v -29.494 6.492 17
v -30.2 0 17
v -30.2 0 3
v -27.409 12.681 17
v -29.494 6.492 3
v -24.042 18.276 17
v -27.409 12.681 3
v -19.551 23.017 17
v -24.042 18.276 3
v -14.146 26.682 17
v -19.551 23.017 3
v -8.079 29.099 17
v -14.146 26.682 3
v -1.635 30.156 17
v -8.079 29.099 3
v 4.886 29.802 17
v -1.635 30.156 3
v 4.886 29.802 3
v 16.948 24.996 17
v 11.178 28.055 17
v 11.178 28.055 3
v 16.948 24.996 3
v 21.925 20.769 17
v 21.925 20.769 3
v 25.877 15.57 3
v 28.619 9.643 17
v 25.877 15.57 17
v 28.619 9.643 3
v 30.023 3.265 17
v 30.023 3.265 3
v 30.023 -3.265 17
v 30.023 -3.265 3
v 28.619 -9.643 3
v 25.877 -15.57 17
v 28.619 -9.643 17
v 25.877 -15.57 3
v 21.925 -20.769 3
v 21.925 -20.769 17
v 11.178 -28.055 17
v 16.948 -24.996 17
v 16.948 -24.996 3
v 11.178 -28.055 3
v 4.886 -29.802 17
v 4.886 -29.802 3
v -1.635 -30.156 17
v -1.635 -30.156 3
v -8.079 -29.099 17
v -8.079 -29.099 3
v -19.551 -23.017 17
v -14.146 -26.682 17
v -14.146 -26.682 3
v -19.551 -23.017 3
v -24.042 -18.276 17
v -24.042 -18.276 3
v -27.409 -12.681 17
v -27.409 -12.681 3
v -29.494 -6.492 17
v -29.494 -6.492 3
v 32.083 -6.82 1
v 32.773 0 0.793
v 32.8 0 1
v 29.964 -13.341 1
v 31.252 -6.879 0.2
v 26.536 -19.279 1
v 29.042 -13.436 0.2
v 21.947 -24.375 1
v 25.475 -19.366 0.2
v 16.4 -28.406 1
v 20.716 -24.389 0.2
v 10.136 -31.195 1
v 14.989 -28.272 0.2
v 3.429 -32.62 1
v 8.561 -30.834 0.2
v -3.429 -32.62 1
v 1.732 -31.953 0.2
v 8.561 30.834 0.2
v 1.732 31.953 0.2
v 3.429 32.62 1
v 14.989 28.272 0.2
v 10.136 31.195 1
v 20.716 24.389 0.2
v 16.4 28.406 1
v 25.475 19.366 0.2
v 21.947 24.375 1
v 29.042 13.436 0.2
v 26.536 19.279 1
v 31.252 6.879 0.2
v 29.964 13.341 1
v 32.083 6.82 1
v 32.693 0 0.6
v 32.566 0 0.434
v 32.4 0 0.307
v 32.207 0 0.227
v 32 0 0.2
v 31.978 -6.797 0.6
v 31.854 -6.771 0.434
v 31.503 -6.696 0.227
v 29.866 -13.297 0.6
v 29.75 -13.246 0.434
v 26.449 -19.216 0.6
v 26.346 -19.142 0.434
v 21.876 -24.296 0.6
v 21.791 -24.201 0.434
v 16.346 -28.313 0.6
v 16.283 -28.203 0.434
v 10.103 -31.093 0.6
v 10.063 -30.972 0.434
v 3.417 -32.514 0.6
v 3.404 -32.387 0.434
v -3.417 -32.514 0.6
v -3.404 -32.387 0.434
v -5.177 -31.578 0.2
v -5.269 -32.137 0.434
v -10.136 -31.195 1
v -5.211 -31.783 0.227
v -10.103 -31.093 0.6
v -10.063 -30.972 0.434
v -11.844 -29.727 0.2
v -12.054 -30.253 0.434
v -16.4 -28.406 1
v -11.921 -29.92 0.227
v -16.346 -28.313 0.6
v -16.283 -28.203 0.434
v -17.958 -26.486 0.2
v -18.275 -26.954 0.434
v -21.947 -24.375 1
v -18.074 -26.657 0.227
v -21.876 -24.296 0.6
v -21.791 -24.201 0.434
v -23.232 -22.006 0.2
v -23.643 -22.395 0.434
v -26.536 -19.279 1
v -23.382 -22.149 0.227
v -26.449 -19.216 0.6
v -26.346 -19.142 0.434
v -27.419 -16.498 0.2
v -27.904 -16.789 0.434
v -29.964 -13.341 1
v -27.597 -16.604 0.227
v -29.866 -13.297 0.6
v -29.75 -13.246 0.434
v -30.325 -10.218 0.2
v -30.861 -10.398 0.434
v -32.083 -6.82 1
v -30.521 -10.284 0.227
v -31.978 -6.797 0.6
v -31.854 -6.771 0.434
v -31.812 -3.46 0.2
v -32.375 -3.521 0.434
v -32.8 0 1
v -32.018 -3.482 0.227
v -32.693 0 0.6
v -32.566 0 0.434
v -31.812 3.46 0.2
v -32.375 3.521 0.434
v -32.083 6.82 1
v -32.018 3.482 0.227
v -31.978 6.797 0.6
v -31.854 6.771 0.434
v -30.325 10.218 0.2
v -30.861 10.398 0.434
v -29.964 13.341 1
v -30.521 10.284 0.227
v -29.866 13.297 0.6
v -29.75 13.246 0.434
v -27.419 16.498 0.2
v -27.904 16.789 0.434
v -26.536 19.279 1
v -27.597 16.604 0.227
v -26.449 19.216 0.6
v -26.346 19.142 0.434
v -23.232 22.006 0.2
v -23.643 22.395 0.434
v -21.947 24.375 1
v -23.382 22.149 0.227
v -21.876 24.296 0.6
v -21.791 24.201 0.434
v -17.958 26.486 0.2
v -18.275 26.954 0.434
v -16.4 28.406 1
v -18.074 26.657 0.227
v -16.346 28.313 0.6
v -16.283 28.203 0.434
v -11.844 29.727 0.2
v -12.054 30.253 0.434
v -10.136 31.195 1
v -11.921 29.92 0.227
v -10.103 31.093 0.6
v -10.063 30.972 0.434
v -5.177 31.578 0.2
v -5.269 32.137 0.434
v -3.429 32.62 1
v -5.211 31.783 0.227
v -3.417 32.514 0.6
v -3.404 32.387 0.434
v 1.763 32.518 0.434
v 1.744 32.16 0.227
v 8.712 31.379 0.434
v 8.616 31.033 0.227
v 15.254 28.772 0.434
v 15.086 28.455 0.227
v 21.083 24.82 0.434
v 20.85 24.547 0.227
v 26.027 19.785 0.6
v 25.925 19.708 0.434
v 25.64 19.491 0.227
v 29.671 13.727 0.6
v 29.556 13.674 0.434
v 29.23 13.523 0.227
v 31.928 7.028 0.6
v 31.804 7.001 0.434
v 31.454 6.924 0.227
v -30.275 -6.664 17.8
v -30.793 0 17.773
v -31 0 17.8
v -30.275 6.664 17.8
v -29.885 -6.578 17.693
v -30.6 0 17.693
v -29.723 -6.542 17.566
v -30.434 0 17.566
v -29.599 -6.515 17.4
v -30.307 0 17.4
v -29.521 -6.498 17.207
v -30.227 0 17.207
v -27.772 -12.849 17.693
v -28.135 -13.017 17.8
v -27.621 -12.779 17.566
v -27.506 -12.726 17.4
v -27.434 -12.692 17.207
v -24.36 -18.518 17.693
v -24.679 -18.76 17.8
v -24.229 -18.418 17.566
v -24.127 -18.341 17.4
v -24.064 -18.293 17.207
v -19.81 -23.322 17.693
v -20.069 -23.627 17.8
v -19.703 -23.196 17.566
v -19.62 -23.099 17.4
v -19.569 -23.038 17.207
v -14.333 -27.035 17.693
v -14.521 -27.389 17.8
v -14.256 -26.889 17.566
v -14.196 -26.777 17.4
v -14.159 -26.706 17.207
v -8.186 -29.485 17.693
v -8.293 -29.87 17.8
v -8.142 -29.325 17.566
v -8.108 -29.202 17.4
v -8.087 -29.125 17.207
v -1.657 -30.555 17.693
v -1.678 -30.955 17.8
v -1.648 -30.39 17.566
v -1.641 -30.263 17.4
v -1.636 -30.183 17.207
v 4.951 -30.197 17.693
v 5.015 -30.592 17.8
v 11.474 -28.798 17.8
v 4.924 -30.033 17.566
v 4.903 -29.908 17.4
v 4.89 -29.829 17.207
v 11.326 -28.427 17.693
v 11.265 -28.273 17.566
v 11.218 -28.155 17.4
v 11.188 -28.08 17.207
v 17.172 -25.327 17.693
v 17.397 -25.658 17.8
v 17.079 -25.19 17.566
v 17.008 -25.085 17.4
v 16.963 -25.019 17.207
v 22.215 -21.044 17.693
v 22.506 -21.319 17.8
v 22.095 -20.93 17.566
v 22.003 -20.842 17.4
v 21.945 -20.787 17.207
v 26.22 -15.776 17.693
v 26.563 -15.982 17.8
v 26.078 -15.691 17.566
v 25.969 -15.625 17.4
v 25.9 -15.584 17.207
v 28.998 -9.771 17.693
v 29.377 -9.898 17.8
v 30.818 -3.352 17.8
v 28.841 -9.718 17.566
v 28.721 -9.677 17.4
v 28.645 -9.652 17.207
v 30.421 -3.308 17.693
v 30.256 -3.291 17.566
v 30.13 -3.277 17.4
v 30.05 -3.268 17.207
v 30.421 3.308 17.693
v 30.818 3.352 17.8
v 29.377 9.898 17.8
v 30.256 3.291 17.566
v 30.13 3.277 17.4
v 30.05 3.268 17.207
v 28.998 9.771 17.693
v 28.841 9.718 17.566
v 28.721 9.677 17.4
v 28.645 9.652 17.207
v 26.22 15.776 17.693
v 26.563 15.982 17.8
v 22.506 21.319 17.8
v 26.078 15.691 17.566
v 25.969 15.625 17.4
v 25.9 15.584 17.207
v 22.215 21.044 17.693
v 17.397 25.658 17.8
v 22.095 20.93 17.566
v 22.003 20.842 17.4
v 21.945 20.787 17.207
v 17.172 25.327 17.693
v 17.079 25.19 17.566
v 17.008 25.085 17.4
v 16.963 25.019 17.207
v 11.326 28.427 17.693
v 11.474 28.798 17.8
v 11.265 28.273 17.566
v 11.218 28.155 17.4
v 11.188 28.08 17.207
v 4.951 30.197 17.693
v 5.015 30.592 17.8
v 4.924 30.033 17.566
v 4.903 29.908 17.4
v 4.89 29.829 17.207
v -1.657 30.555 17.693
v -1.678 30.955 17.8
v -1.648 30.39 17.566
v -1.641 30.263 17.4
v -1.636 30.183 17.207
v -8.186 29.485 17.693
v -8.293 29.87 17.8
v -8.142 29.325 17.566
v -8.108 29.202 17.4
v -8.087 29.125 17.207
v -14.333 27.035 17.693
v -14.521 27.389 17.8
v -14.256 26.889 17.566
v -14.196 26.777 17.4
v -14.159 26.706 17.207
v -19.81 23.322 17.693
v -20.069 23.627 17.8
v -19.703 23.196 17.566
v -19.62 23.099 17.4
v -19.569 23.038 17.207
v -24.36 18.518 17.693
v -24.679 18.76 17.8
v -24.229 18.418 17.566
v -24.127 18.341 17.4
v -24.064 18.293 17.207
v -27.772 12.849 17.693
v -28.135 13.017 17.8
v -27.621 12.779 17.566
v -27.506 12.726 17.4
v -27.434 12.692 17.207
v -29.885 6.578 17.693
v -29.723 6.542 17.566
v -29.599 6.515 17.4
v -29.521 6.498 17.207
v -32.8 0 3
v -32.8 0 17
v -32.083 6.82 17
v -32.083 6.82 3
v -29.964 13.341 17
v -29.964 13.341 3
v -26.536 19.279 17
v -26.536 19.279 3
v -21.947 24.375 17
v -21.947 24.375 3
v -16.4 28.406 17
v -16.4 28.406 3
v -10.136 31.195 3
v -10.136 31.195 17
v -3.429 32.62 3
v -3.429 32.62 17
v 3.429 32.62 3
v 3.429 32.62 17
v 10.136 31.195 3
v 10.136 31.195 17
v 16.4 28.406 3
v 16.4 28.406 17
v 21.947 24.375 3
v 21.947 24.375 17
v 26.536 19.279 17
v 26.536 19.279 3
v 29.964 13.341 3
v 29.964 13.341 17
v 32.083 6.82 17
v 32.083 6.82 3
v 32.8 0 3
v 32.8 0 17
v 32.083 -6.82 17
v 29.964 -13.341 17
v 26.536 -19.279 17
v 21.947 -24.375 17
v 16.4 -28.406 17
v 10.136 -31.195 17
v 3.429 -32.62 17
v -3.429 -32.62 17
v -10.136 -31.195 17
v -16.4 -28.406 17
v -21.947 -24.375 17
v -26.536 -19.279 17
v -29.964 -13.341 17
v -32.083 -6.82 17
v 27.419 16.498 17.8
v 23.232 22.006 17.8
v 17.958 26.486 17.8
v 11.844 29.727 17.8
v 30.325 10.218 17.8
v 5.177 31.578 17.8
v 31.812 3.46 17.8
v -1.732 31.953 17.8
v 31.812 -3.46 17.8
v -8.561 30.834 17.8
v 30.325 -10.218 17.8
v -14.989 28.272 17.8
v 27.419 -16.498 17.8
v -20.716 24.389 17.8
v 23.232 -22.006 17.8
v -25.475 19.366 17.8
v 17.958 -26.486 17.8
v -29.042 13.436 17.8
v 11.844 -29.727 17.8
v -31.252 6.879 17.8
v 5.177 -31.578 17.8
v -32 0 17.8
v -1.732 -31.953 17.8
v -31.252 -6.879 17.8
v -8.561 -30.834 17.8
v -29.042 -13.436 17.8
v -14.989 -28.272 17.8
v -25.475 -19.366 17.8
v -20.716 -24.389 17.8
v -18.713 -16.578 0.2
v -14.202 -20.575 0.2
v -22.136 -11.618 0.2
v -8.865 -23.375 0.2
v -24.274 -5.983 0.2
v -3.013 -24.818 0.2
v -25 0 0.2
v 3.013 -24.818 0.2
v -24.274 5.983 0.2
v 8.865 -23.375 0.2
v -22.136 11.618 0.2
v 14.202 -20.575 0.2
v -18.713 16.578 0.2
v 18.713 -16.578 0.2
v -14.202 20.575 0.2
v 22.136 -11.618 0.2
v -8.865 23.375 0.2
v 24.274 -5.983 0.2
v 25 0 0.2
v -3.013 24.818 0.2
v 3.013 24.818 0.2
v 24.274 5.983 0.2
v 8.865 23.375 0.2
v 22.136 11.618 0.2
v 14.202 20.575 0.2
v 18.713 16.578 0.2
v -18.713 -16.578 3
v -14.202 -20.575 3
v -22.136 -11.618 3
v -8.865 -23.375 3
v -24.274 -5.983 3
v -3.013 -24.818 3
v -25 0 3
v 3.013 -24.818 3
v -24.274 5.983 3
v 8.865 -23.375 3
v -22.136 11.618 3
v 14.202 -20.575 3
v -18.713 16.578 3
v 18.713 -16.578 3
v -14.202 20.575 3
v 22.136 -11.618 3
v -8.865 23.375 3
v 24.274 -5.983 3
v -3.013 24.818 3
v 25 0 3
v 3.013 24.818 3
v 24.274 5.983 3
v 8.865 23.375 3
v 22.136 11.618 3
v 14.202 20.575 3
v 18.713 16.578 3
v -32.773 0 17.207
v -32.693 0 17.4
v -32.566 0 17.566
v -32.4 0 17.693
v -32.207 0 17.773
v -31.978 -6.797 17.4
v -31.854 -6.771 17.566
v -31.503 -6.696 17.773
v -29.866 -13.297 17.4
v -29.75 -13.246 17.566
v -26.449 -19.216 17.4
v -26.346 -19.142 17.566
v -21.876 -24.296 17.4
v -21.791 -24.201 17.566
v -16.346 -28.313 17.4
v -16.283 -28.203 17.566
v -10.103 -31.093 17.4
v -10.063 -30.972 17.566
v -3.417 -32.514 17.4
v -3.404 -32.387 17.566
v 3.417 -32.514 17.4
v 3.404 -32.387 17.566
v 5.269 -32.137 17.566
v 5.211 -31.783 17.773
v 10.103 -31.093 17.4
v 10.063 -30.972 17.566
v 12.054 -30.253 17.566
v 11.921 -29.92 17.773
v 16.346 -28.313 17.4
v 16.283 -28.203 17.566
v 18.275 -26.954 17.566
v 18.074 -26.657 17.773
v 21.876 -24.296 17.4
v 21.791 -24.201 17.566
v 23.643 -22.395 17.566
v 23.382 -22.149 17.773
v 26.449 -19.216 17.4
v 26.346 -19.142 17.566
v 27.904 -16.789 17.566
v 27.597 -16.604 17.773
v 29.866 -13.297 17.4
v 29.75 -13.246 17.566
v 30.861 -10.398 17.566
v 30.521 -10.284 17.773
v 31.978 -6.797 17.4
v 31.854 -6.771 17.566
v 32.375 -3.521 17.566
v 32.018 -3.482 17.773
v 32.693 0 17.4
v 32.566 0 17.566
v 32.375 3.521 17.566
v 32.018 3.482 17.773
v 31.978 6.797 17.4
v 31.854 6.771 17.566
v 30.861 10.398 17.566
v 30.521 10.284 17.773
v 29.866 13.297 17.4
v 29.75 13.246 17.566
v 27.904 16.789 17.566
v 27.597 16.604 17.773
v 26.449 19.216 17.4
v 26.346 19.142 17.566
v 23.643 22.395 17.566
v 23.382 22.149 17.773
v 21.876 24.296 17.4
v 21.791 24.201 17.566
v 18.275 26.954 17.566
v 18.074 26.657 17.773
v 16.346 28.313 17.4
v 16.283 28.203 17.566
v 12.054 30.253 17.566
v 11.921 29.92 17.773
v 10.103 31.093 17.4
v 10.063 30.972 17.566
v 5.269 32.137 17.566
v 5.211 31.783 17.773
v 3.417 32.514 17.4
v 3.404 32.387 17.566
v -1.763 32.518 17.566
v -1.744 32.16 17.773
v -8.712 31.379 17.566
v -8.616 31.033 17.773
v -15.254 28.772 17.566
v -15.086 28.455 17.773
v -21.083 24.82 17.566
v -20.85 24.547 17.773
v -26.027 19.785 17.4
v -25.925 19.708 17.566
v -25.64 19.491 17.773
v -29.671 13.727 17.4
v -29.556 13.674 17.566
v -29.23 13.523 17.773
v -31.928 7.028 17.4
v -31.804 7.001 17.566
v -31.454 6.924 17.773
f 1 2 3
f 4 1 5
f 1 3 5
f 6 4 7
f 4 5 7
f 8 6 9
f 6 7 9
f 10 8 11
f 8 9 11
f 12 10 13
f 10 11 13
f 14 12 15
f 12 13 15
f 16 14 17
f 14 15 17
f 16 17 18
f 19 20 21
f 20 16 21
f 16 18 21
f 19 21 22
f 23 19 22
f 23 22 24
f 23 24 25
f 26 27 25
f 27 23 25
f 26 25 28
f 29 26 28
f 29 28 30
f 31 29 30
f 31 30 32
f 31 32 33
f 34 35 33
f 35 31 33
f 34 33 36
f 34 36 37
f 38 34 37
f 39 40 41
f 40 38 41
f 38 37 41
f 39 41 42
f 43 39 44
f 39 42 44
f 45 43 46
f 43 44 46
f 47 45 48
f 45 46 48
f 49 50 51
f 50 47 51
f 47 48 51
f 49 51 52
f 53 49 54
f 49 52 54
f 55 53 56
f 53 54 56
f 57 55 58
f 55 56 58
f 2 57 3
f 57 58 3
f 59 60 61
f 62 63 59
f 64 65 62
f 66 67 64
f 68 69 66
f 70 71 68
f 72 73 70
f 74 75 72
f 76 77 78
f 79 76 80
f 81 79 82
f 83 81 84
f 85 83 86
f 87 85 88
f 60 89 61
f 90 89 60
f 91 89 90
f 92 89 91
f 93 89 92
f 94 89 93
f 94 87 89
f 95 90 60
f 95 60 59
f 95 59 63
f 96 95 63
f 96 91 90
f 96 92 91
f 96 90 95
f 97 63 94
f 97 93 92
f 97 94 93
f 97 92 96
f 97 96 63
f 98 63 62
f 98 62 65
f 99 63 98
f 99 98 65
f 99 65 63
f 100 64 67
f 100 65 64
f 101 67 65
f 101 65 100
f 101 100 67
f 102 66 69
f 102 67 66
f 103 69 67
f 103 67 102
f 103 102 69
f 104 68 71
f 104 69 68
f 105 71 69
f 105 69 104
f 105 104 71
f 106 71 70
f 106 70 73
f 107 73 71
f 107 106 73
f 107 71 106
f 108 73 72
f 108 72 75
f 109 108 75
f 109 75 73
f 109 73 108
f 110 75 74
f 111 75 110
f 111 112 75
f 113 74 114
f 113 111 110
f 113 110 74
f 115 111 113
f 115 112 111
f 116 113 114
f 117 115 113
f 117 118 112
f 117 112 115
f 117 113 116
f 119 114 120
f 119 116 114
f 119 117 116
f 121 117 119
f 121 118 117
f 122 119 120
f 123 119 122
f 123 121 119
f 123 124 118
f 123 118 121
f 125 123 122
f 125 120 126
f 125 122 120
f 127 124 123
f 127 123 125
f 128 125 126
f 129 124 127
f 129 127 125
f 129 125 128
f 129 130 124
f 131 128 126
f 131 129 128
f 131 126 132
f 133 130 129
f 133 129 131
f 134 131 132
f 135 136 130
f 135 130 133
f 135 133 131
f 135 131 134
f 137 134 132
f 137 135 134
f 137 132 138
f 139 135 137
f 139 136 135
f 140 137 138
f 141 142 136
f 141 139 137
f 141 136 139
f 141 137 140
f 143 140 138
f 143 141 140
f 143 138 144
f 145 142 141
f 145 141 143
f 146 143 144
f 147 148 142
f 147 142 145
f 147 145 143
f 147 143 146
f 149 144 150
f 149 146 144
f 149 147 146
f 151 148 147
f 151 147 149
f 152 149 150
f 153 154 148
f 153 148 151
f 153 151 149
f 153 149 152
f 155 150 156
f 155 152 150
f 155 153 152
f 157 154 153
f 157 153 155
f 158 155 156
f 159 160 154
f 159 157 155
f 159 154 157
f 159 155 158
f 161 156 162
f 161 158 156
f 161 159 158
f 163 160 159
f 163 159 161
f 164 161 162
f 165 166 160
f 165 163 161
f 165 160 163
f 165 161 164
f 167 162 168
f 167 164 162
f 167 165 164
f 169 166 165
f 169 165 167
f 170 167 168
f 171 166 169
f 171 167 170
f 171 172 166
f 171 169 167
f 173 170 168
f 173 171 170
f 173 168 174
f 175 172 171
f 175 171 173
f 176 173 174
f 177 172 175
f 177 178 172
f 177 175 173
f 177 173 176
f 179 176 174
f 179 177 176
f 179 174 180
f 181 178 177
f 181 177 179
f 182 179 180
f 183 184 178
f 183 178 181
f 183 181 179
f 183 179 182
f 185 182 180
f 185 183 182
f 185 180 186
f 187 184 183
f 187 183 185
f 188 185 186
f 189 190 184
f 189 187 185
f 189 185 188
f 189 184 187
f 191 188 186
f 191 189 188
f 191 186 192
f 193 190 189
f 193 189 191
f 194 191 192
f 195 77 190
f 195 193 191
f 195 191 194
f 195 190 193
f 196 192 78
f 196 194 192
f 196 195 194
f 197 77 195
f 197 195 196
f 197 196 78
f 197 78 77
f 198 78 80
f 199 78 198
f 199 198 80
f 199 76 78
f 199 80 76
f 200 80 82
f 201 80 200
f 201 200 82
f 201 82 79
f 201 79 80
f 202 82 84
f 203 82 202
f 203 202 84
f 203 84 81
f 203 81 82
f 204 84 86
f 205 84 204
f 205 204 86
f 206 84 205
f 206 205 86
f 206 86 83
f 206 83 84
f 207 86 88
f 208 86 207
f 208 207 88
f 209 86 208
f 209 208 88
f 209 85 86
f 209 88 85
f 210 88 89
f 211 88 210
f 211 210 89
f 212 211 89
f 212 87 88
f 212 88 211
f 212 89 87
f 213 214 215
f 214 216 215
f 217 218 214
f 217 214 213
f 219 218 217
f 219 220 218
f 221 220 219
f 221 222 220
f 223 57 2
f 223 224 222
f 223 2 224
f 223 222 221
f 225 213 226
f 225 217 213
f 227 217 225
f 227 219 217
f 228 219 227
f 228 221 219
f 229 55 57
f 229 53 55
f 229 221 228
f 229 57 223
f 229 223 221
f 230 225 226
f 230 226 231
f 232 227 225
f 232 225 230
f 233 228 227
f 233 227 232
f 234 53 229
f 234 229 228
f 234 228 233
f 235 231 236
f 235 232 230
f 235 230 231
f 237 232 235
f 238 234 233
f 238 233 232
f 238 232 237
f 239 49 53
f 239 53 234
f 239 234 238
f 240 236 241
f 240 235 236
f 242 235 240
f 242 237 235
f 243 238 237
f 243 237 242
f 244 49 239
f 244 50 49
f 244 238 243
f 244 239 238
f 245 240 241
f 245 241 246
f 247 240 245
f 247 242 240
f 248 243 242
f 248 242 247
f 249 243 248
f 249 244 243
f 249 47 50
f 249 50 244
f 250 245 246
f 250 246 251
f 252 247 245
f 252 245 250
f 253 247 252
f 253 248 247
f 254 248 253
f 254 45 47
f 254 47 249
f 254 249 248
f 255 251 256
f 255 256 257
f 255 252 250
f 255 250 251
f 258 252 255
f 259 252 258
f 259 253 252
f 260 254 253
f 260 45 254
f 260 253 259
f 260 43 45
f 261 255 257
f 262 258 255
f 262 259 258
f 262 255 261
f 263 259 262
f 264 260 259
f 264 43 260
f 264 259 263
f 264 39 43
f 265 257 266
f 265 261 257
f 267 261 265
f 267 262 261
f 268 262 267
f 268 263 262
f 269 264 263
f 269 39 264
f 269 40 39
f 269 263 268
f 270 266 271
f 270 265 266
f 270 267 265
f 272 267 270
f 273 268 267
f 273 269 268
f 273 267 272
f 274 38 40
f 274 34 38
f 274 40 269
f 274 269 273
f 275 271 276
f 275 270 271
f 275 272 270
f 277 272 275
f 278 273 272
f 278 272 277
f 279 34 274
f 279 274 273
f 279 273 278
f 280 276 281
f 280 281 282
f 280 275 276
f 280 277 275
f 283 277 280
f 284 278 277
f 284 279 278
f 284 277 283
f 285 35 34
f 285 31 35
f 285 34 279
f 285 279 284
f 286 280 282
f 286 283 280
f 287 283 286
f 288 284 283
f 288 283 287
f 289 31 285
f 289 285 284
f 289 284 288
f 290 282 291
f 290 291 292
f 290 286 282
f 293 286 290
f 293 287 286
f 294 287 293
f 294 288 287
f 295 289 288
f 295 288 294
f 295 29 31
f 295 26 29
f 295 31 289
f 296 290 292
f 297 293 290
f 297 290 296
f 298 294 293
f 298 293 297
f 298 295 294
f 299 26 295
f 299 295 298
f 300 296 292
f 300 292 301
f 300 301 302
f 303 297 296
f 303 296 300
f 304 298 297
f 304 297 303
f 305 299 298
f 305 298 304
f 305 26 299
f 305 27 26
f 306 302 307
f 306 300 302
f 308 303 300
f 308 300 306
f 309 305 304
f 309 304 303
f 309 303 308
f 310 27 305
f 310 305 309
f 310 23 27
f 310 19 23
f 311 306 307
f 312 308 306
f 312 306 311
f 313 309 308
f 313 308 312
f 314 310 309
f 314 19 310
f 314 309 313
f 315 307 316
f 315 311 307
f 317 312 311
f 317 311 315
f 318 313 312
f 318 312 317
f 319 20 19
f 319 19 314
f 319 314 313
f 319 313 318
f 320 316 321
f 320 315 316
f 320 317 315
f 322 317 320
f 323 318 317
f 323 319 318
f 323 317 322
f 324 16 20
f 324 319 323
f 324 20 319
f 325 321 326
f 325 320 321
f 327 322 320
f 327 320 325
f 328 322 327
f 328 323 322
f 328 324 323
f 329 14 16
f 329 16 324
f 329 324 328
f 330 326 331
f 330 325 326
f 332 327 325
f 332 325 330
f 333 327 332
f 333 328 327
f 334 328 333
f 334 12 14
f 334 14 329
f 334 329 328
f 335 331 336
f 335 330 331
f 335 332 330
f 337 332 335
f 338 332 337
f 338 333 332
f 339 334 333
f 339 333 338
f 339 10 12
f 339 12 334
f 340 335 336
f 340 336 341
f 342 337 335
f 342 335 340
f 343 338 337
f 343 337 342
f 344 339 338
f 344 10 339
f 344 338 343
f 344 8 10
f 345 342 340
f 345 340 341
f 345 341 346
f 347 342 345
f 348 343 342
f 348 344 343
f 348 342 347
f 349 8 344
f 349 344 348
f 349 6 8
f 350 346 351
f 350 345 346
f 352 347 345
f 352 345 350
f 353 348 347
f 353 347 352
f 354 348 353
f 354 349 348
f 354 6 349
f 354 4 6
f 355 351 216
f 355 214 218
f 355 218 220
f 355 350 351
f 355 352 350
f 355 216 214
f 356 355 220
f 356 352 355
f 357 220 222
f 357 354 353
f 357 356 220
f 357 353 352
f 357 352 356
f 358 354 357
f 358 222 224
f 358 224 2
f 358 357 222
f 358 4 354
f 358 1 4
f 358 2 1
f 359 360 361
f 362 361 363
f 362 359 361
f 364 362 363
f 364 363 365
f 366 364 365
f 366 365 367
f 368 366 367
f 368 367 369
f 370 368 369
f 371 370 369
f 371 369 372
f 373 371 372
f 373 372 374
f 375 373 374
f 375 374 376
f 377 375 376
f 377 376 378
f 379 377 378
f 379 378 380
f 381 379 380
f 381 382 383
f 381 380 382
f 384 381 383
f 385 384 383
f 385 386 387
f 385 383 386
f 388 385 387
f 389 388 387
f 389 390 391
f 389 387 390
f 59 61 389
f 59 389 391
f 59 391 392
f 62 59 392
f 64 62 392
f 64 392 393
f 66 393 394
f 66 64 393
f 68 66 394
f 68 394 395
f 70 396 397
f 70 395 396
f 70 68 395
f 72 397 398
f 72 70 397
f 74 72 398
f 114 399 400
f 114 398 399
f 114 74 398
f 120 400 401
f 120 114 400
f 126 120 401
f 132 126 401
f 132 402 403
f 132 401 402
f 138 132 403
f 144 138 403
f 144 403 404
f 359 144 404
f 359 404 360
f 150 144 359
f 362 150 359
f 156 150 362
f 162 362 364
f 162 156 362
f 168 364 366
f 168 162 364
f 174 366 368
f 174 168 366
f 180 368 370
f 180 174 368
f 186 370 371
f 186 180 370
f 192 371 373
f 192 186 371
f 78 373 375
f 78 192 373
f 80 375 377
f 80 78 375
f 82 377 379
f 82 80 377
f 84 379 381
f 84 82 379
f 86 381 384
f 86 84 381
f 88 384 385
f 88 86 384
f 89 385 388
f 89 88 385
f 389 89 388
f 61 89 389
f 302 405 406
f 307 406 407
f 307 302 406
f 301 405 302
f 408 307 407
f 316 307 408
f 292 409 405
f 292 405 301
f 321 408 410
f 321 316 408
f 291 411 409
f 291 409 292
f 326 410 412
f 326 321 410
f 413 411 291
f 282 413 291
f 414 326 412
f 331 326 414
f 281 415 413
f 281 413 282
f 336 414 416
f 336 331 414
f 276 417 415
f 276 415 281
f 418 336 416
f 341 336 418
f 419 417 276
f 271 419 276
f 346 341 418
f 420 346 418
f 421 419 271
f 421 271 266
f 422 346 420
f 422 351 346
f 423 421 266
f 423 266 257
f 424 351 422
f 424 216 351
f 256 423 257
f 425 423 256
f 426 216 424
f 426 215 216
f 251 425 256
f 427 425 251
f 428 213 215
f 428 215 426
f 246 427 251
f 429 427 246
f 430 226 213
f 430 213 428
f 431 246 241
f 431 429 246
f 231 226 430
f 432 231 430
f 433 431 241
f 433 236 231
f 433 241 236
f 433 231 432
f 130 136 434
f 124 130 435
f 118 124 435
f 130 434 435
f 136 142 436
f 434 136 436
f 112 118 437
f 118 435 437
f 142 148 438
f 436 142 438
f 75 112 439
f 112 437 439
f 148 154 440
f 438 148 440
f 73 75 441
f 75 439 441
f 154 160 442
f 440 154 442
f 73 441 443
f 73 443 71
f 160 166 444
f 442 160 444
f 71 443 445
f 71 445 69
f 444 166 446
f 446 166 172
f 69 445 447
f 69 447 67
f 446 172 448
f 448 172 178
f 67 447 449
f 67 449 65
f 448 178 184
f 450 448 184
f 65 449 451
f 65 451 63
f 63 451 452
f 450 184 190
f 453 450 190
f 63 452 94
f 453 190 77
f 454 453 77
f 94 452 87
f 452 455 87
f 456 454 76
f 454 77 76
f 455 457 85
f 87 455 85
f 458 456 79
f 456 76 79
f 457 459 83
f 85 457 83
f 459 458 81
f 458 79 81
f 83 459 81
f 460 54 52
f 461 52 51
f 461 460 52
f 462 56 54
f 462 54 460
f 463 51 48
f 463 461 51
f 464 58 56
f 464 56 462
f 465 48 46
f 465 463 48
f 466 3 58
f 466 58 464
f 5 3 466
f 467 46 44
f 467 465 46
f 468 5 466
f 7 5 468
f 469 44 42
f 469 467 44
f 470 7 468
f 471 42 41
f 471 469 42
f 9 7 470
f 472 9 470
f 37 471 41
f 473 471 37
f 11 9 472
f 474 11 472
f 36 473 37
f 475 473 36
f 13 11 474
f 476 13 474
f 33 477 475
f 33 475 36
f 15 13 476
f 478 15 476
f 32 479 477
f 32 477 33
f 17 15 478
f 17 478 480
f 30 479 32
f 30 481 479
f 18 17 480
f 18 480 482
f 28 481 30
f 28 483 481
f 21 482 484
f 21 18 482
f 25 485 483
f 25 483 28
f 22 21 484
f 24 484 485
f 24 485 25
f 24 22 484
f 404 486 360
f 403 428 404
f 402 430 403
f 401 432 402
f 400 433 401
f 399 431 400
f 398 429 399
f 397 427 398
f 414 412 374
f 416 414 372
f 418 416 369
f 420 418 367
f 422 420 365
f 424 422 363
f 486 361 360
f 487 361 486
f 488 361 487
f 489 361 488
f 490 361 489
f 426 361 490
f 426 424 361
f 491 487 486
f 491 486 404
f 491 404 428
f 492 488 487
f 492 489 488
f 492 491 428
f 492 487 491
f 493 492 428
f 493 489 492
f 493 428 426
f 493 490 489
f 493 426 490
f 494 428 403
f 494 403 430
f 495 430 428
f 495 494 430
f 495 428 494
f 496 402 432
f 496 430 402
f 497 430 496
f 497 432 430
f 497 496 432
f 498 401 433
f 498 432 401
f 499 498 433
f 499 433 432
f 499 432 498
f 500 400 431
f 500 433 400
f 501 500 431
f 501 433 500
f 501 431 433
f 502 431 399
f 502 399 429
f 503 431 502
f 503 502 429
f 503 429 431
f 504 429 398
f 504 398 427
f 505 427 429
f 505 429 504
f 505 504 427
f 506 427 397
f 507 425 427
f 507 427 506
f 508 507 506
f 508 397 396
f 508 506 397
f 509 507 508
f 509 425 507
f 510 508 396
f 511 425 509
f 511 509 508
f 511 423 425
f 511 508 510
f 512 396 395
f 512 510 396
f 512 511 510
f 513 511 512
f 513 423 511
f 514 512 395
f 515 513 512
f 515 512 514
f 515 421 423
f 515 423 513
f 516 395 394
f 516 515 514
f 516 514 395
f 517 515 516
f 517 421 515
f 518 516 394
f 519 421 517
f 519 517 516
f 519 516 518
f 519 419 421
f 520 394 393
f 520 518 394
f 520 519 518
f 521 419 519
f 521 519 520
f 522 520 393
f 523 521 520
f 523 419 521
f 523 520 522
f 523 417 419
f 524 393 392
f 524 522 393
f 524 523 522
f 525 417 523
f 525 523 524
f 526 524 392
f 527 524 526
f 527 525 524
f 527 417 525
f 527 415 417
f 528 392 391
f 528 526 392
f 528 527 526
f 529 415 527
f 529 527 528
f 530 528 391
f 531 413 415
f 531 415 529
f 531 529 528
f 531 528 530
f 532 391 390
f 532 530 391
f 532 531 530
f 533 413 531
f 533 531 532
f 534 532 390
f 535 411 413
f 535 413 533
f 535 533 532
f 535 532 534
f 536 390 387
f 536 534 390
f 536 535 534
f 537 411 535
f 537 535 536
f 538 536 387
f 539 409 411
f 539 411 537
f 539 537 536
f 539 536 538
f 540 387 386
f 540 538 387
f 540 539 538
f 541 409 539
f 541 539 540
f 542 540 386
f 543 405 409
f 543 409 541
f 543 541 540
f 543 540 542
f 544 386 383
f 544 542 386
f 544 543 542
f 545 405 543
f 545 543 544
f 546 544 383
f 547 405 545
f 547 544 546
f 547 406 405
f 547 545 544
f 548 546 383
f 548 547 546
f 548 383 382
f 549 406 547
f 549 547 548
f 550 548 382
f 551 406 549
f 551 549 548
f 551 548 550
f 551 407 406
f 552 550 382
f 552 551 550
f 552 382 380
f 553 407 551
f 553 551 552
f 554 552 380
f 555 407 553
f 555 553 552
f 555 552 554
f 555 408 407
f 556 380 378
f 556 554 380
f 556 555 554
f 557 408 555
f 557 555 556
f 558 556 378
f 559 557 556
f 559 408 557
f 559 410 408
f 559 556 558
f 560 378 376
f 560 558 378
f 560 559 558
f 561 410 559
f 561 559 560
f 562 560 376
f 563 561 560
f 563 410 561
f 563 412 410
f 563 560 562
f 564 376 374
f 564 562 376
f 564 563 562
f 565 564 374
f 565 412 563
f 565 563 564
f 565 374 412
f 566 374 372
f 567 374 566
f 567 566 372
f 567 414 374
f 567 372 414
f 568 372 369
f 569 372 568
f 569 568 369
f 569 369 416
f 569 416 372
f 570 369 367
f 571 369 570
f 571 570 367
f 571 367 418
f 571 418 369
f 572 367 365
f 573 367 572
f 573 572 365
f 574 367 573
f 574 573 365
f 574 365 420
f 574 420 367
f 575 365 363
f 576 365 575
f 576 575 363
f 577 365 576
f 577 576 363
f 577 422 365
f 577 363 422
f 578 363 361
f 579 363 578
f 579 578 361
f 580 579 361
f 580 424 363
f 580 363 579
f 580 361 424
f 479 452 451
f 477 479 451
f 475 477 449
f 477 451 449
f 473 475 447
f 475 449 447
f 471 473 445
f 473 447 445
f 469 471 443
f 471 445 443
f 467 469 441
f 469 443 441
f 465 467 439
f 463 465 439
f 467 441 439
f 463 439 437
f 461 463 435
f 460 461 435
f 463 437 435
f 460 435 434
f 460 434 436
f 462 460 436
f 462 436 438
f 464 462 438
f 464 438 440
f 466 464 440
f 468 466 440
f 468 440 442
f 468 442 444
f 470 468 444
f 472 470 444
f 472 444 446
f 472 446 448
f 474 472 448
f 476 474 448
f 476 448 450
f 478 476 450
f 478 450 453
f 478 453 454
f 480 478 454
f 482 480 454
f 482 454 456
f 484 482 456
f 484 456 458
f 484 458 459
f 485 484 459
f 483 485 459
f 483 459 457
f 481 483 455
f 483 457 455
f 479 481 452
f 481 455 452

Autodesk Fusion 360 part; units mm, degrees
sketch "Sketch1" plane through (0, 0, 0) normal (0, 0, 1) x (1, 0, 0)
  circle A0 centre (0, 0) radius 25
  circle A1 centre (0, 0) radius 30
  circle A2 centre (0, 0) radius 33
  dimension "d1" = 50
  dimension "d2" = 60
  dimension "d3" = 66
extrude "Extrude1" add sketch "Sketch1" along normal blind 3 contours A1 | A2
sketch "Sketch2" plane through (0, 0, 3) normal (0, 0, 1) x (-1, 0, 0)
  circle A0 centre (0, 0) radius 25
  circle A1 centre (0, 0) radius 33
  circle A2 centre (0, 0) radius 30
  circle A3 centre (0, 0) radius 33
extrude "Extrude2" add sketch "Sketch2" along normal blind 15 contours A1 A3
fillet "Fillet1" radius 1 2 edges at (27.9698, -10.8485, 18) (30.7668, 11.9333, 18)
fillet "Fillet2" radius 1 1 edges at (-30.7668, -11.9333, 0)
move_face "OffsetFaces1" offset -0.2 1 faces at (-29.8509, 2.987, 7.6667)
